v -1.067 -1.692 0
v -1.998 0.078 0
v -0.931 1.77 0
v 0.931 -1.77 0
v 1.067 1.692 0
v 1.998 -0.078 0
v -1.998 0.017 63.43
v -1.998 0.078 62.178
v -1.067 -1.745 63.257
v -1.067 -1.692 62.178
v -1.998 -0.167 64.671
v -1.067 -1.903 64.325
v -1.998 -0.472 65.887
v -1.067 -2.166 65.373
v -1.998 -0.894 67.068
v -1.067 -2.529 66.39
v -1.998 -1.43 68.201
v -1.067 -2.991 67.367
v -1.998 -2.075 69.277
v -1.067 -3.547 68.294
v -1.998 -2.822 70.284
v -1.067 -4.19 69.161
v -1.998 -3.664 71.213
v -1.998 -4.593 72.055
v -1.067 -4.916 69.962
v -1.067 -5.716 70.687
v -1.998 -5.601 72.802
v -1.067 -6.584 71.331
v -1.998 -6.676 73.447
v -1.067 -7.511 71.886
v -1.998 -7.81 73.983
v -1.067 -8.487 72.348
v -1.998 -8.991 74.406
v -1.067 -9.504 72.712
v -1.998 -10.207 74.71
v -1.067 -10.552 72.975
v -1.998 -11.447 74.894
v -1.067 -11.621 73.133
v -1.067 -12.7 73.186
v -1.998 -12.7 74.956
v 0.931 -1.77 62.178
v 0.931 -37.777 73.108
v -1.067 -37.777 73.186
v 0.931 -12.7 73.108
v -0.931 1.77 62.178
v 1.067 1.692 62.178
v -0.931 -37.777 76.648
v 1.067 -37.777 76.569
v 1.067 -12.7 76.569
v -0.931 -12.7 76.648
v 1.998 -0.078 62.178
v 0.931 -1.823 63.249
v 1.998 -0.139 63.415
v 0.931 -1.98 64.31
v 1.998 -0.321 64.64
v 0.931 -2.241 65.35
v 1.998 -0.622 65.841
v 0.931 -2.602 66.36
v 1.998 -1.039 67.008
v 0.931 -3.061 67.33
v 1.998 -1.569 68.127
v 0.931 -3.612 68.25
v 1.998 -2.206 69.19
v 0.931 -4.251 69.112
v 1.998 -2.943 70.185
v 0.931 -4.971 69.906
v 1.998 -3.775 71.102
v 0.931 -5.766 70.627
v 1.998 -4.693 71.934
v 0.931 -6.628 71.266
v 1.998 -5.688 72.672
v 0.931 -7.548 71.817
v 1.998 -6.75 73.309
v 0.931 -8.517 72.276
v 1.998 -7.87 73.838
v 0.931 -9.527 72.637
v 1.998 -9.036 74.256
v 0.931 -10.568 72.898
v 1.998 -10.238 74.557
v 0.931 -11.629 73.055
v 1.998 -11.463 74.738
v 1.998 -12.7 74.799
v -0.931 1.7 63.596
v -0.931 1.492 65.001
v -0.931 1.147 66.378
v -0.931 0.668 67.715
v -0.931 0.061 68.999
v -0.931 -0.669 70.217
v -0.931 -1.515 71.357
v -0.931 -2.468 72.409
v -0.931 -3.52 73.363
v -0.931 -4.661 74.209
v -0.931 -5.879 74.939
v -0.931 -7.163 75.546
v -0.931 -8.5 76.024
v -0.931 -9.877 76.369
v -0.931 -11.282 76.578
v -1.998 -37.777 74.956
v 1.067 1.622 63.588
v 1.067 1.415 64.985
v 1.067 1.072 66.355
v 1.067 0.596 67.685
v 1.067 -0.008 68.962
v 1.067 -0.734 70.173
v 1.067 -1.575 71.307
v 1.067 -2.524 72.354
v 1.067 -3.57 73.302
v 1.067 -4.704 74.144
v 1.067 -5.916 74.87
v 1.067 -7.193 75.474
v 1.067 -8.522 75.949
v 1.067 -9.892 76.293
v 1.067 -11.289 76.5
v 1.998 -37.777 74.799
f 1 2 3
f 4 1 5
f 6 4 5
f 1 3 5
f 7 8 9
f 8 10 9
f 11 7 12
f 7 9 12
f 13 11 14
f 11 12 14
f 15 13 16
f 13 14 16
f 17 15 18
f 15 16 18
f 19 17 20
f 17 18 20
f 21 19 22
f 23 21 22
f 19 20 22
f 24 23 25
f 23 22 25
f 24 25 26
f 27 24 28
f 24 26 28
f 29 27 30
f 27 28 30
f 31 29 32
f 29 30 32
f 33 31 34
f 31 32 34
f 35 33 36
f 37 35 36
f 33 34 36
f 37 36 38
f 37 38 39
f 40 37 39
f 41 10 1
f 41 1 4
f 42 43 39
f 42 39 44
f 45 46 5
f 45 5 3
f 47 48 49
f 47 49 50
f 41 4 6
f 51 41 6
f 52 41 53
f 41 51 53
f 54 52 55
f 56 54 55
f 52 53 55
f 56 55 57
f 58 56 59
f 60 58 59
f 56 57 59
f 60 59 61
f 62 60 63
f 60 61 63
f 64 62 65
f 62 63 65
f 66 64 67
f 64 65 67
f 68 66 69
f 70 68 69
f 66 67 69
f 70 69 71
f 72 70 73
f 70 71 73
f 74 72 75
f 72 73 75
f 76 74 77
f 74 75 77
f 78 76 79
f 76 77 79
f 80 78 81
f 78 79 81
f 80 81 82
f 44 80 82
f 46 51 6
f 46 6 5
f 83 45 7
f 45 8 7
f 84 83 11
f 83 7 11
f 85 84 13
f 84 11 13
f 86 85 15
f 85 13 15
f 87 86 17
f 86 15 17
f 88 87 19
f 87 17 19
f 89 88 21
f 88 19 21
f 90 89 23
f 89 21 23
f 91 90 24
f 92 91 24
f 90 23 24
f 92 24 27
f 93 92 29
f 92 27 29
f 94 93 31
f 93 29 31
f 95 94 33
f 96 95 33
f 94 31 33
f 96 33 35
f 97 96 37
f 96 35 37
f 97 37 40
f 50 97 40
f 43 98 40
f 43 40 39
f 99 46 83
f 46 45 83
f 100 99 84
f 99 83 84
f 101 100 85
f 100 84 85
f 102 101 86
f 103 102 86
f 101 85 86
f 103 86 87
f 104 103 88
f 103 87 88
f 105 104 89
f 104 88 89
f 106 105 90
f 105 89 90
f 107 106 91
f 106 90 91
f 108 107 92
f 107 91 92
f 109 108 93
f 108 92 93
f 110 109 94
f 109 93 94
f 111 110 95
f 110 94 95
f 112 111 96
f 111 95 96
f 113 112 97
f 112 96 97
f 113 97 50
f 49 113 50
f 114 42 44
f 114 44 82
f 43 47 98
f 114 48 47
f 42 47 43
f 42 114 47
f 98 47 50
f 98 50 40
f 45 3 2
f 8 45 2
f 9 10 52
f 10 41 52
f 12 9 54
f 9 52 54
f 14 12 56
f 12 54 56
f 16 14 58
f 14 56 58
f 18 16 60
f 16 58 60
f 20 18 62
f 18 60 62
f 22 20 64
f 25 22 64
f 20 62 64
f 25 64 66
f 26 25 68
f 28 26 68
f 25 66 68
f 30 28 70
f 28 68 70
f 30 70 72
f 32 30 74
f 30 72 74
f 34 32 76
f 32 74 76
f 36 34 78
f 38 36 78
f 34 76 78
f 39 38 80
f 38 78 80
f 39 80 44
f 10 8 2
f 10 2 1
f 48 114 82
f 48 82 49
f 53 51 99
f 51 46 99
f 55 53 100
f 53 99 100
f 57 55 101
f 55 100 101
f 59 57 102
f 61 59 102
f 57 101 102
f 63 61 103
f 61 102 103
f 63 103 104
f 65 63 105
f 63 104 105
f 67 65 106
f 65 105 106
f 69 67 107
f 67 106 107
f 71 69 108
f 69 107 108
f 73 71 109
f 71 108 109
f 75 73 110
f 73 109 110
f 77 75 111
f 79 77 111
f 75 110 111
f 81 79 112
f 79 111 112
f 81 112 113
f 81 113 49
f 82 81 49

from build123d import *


with BuildPart() as f2:
    # F2: sweep along a path in F1
    with BuildLine(Plane.YZ) as f2_path:
        Line((0, 0), (0, 62.177598))
        ThreePointArc((0, 62.177598), (-3.719744, 71.157854), (-12.7, 74.877598))
        Line((-12.7, 74.877598), (-37.777253, 74.877598))
    # F0 (on Top) → F2 (sweep)
    with BuildSketch(Plane.XY):
        Polygon((-1.998463, 0.078399), (-1.067127, -1.69152), (0.931336, -1.769919), (1.998463, -0.078399), (1.067127, 1.69152), (-0.931336, 1.769919), align=None)
    sweep(path=f2_path.line)


solid = f2.part
